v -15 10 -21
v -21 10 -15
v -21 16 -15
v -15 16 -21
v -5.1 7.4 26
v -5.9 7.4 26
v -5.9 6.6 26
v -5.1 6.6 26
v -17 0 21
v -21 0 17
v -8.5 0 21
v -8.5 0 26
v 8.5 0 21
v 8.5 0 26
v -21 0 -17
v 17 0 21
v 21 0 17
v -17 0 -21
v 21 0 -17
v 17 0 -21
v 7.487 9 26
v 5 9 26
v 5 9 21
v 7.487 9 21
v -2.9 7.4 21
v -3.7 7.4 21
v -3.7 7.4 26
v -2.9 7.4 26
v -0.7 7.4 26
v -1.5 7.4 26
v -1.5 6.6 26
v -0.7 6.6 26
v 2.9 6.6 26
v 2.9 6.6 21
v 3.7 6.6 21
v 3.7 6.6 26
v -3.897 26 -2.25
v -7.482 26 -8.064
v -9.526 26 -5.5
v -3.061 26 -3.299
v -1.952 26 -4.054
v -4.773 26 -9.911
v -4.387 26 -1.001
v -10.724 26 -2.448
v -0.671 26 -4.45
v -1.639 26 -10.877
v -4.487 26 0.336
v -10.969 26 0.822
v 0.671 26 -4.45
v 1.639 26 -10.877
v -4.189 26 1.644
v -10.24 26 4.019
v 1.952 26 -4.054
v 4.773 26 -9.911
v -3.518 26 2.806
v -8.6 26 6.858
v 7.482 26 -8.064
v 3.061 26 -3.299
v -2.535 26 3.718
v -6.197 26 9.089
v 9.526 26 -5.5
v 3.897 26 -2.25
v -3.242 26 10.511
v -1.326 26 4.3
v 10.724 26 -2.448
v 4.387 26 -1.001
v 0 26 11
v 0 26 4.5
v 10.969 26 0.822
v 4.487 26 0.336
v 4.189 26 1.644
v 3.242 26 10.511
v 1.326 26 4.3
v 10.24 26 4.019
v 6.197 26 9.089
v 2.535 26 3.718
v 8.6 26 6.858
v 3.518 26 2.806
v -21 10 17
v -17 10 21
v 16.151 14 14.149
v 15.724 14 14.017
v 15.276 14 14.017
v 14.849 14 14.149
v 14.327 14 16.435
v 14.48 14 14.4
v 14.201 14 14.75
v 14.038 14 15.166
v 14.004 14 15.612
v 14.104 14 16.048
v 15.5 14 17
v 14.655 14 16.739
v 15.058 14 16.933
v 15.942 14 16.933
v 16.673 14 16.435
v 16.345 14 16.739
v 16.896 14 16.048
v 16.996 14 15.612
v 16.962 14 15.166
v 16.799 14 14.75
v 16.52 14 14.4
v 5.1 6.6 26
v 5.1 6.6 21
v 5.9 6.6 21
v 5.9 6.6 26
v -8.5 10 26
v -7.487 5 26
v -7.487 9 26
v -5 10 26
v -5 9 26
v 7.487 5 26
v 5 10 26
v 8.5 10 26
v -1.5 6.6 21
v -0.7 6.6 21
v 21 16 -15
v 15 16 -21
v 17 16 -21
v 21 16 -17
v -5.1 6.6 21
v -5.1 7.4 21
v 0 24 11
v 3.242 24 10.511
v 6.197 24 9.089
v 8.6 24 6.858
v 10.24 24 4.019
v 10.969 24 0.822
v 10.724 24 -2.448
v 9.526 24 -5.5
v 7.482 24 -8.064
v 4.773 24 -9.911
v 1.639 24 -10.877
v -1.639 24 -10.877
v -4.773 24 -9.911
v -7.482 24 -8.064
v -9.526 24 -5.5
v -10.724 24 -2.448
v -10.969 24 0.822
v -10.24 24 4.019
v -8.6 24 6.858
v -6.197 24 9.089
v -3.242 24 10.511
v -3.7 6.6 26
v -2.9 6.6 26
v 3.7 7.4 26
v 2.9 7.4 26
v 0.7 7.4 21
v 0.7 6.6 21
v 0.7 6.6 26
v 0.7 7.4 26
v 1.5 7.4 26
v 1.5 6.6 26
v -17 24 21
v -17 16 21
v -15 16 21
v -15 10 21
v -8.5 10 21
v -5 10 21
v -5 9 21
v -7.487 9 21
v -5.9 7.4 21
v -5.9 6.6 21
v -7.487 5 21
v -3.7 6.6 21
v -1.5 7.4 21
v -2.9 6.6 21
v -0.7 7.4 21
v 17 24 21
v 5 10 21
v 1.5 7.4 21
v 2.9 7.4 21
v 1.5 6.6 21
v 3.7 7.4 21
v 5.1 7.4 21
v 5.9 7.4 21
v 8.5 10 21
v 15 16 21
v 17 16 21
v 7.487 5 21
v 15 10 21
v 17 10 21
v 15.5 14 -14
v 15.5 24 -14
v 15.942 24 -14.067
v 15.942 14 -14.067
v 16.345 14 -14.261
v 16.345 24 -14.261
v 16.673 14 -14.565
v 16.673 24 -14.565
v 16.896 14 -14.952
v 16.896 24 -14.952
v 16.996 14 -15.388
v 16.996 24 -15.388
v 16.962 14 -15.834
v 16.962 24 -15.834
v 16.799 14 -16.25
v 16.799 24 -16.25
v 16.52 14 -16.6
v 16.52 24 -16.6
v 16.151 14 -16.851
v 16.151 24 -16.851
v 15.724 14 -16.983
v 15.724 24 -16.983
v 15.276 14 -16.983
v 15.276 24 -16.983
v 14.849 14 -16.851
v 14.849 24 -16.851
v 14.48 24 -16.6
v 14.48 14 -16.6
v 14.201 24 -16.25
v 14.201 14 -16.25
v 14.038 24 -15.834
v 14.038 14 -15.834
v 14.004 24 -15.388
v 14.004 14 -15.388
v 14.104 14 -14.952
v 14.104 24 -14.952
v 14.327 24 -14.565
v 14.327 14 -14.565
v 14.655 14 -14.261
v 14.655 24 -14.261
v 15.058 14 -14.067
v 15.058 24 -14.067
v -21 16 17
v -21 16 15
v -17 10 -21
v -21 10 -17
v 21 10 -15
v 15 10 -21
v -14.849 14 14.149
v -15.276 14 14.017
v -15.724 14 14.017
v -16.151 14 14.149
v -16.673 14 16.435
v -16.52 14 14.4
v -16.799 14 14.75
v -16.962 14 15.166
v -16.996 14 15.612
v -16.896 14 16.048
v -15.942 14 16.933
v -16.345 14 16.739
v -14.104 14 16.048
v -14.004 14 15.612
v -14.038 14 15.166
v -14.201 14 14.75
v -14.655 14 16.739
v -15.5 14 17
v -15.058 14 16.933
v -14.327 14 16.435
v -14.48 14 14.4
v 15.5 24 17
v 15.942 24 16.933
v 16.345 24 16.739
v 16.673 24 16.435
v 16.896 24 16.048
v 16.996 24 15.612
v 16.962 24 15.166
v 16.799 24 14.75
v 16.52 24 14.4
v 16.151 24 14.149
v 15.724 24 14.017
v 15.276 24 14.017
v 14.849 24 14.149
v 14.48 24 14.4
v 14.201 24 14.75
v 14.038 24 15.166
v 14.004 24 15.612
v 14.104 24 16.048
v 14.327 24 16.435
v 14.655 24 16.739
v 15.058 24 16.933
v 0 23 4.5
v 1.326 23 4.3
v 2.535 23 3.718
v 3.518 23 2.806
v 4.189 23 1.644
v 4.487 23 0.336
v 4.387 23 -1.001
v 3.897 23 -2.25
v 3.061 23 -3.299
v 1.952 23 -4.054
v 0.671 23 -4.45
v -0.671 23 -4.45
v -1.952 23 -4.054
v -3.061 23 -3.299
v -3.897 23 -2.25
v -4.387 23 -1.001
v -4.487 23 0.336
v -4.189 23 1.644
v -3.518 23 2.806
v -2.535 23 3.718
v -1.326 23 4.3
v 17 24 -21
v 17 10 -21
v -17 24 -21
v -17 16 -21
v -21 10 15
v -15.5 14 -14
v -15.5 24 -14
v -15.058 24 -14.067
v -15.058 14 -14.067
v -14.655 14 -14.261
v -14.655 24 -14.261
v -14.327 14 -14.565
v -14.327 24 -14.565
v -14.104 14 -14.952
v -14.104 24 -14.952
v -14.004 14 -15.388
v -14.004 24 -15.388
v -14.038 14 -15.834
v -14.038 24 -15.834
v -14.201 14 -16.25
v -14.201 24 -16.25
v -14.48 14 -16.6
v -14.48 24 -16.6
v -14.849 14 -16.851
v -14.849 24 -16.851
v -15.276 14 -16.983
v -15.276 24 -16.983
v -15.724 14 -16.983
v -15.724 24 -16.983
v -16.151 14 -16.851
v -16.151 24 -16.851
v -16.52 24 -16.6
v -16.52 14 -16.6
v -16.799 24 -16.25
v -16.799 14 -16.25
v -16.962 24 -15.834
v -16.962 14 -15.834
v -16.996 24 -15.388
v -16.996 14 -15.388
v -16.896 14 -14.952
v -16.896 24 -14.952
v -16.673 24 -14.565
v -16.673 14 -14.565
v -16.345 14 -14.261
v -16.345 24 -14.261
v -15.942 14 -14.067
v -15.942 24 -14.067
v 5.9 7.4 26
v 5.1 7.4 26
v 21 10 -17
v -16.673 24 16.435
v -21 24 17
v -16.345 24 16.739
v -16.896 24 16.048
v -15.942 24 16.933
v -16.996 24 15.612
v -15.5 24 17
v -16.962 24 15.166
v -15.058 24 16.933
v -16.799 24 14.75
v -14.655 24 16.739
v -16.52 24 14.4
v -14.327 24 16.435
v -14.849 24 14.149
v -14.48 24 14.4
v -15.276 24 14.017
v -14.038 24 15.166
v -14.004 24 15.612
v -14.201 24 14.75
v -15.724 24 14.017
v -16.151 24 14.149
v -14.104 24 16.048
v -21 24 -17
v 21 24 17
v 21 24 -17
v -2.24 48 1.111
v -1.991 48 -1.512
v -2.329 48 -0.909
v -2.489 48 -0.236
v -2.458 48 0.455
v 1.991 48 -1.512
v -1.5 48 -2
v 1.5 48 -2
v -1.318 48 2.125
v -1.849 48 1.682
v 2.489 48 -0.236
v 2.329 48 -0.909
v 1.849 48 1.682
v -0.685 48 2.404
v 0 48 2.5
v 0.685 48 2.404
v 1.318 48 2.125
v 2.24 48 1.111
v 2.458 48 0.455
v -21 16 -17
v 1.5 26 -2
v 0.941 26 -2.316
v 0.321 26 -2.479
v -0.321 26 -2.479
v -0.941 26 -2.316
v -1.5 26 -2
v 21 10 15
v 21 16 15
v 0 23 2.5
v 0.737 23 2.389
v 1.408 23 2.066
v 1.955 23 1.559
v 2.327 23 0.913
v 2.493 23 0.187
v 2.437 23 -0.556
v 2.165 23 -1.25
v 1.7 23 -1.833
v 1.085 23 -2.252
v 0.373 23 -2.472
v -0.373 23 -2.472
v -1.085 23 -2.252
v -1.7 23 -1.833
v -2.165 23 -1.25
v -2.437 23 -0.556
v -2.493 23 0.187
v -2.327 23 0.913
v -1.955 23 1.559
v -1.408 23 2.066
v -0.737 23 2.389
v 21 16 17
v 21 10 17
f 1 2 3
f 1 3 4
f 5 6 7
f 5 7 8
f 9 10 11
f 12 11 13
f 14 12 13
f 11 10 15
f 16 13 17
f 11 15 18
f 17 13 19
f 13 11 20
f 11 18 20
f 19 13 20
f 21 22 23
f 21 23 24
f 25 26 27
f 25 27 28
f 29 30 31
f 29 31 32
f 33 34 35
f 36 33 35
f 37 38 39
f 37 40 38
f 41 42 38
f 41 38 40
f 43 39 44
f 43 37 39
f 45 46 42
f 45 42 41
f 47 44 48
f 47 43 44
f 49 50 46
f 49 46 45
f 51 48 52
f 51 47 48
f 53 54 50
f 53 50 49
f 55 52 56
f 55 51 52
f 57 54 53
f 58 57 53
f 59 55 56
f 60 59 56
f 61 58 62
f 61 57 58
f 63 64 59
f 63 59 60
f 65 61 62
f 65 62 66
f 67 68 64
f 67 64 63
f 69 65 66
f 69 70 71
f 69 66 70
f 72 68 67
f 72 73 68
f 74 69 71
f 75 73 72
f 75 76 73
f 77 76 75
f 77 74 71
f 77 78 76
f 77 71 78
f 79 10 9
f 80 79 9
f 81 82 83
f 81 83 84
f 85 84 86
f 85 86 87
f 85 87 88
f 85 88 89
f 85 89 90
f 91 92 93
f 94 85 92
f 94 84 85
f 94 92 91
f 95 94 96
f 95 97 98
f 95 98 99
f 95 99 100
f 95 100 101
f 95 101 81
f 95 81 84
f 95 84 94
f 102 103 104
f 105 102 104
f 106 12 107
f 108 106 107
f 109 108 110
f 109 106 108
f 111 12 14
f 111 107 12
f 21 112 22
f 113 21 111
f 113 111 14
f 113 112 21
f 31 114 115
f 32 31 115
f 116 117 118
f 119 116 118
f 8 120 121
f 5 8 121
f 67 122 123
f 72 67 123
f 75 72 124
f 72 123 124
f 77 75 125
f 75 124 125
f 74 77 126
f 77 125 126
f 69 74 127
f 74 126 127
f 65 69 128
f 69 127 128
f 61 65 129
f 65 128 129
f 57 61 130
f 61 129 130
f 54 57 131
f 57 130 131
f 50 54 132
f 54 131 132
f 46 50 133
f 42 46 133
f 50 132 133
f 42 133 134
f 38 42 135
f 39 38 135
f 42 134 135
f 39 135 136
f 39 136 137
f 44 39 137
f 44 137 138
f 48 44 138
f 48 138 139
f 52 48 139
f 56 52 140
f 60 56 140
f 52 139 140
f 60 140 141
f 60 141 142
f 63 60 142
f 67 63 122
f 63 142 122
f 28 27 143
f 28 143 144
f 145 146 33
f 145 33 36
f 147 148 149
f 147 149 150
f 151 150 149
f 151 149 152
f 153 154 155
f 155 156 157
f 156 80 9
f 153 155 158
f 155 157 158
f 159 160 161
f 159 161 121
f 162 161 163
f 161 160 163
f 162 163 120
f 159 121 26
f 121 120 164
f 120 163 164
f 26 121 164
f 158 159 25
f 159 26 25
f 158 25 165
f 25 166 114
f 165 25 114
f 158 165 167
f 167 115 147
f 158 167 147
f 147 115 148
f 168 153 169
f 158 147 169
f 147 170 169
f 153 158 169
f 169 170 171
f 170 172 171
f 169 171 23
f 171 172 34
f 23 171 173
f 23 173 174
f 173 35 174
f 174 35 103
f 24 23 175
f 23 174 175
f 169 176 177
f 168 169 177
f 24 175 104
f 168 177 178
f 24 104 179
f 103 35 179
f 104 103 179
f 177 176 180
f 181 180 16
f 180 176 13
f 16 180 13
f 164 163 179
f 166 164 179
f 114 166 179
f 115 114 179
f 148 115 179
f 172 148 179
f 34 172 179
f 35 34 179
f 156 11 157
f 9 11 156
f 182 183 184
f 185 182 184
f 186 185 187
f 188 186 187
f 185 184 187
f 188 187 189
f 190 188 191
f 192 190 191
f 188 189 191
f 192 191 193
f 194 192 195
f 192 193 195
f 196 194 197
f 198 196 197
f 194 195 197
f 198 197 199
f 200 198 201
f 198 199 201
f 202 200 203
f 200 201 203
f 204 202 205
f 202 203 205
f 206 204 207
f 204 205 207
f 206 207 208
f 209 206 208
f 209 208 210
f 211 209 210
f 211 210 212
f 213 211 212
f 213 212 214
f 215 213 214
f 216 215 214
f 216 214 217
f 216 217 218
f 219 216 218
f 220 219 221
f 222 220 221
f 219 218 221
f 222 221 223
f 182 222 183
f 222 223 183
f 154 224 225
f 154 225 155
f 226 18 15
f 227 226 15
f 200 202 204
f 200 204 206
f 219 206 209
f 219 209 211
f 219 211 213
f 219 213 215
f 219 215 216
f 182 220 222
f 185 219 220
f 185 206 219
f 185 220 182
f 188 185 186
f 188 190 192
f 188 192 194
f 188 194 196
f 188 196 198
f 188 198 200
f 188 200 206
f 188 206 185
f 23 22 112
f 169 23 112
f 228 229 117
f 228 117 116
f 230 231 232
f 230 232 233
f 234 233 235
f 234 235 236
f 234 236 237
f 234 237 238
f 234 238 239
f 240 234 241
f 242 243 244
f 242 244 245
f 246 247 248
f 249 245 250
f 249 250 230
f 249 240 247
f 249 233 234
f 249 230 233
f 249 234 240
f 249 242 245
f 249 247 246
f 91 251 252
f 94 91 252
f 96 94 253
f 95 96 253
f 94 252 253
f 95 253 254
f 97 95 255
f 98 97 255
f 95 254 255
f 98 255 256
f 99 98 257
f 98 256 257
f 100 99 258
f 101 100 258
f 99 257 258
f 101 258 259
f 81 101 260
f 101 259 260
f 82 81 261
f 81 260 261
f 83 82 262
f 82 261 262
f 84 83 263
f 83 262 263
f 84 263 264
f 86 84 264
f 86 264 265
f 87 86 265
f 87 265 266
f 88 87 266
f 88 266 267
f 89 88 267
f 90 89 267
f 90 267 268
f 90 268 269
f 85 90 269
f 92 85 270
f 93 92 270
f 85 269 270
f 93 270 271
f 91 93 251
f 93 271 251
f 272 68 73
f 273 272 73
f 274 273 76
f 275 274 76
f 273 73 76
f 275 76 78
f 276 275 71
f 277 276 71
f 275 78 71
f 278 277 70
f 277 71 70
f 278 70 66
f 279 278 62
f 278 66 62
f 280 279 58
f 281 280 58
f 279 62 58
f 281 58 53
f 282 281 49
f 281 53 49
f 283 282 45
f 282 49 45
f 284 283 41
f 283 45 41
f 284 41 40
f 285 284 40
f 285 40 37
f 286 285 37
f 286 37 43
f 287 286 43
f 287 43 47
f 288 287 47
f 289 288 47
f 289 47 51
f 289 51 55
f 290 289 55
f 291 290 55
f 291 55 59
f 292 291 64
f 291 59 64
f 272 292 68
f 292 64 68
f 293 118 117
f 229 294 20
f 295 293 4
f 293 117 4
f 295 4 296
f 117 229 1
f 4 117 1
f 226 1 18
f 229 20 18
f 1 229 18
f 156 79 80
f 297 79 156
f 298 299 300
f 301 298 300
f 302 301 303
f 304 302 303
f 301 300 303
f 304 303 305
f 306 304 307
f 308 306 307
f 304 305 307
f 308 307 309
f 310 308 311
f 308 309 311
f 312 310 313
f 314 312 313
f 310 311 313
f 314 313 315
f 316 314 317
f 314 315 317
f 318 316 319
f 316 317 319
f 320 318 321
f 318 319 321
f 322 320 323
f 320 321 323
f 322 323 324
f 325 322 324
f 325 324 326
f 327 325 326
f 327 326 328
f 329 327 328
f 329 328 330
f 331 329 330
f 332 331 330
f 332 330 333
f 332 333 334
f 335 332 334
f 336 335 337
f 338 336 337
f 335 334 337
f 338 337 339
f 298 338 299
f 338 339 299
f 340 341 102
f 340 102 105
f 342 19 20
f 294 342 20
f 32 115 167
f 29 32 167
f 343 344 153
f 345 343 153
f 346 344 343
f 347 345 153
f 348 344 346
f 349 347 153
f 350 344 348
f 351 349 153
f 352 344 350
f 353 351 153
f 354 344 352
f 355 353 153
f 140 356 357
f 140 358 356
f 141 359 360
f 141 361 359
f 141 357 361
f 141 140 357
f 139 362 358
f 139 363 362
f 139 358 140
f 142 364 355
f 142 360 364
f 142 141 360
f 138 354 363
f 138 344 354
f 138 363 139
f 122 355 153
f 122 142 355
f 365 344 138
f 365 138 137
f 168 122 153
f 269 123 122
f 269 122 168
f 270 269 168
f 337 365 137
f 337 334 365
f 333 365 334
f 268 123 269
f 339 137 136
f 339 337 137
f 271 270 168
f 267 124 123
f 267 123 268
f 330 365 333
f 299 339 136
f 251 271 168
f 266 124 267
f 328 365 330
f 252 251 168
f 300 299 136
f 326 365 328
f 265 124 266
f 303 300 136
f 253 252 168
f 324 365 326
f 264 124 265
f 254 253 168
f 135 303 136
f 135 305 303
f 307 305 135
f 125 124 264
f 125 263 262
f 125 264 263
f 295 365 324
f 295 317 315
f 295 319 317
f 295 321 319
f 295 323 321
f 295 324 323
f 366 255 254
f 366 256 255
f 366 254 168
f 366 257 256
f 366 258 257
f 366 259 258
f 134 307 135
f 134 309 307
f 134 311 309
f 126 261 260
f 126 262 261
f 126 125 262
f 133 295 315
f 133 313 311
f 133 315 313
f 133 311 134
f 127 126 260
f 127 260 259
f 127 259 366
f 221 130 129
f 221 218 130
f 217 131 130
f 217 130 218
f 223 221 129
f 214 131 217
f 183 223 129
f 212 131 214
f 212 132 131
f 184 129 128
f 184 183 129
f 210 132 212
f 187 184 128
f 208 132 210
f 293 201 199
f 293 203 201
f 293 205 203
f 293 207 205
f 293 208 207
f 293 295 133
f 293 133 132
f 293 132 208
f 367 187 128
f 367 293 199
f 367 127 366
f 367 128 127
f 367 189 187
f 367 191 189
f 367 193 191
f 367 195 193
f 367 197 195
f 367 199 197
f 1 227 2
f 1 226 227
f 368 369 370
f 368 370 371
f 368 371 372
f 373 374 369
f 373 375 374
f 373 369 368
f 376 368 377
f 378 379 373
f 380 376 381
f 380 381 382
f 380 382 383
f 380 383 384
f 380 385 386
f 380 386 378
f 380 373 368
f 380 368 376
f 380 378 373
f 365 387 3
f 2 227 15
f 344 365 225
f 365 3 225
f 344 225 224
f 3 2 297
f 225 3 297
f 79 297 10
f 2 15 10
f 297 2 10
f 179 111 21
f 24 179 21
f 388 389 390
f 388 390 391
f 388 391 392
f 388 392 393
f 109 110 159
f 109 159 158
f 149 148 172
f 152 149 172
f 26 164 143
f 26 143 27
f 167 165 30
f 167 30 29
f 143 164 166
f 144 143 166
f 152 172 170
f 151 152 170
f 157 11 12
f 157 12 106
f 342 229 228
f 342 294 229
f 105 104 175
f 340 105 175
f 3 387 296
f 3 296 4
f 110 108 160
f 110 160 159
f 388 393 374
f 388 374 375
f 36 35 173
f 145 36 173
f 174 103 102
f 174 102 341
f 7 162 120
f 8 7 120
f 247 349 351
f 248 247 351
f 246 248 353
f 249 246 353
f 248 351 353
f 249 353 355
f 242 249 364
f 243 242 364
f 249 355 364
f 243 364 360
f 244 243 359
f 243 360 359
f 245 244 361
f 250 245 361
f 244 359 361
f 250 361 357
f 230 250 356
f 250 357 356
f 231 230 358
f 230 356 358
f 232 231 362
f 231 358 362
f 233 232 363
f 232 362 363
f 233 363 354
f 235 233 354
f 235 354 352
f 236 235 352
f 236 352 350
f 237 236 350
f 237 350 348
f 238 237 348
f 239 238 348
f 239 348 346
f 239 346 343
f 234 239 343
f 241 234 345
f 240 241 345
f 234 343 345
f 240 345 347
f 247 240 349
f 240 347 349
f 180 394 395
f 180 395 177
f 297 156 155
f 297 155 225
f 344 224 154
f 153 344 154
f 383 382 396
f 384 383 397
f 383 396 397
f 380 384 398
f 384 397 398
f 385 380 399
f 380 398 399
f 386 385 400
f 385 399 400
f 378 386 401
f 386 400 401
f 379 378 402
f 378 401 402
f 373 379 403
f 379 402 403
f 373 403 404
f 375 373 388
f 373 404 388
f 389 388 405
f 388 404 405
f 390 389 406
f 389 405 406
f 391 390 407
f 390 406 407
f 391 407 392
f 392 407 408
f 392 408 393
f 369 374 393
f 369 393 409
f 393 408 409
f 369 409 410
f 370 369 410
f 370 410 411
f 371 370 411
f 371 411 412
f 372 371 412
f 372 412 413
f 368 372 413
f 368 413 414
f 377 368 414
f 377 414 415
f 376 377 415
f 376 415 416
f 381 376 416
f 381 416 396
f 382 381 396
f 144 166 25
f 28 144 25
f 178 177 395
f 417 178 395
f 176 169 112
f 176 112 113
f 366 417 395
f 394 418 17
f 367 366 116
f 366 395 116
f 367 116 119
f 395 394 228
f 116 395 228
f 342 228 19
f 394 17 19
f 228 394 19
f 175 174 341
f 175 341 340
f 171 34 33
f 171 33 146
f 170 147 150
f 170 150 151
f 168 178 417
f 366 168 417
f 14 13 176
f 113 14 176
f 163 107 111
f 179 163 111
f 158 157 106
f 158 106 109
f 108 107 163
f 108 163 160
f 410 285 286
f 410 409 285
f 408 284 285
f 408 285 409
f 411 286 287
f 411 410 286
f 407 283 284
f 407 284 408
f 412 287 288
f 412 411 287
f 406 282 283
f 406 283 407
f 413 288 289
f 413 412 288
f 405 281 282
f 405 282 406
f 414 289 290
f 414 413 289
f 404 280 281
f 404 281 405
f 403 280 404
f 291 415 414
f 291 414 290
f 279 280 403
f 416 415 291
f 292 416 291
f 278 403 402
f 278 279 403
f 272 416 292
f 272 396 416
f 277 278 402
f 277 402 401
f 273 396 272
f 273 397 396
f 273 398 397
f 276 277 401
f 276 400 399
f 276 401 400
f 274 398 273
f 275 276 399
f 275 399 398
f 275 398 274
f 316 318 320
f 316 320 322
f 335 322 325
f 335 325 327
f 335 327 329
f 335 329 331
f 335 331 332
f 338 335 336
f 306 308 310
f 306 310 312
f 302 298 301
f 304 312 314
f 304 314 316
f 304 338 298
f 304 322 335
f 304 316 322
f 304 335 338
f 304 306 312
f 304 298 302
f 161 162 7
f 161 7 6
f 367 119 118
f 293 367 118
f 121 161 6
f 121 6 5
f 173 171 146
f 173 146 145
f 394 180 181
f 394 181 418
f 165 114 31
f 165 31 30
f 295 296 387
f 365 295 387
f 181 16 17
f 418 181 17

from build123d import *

# Parameters (mm, degrees)
EXTRUDE_1_DEPTH     = 10
EXTRUDE_2_DEPTH     = 6
EXTRUDE_3_DEPTH     = 8
SKETCH_5_R          = 11
EXTRUDE_4_DEPTH     = 2
SKETCH_6_R          = 4.5
CUT_EXTRUDE_1_DEPTH = 3
SKETCH_7_R          = 2.5
EXTRUDE_5_DEPTH     = 25
CUT_EXTRUDE_START   = -22
CUT_EXTRUDE_2_DEPTH = 22
SKETCH_9_R          = 1.5
CUT_EXTRUDE_3_DEPTH = 10
SKETCH_10_W         = 17
SKETCH_10_H         = 10
EXTRUDE_6_DEPTH     = 5
SKETCH_11_W         = 14.973580244
SKETCH_11_H         = 4
CUT_EXTRUDE_4_DEPTH = 5
SKETCH_12_W         = 10
SKETCH_12_H         = 1.224563607
CUT_EXTRUDE_5_DEPTH = 5
SKETCH_13_W         = 0.8
SKETCH_13_H         = 0.8
EXTRUDE_7_DEPTH     = 5


with BuildPart() as part:
    # 草图1 → 凸台-拉伸1 (new body)
    with BuildSketch(Plane(origin=(0, 0, 0), x_dir=(1, 0, 0), z_dir=(0, 1, 0))):
        Polygon((-17, -21), (17, -21), (21, -17), (21, 17), (17, 21), (-17, 21), (-21, 17), (-21, -17), align=None)
    extrude(amount=EXTRUDE_1_DEPTH)

    # 草图3 → 凸台-拉伸2 (add)
    with BuildSketch(Plane(origin=(0, 10, 0), x_dir=(1, 0, 0), z_dir=(0, 1, 0))):
        Polygon((15, 21), (21, 15), (21, -15), (15, -21), (-15, -21), (-21, -15), (-21, 15), (-15, 21), align=None)
    extrude(amount=EXTRUDE_2_DEPTH)

    # 草图4 → 凸台-拉伸3 (add)
    with BuildSketch(Plane(origin=(0, 16, 0), x_dir=(1, 0, 0), z_dir=(0, 1, 0))):
        Polygon((15, 21), (-15, 21), (-17, 21), (-21, 17), (-21, 15), (-21, -15), (-21, -17), (-17, -21), (-15, -21), (15, -21), (17, -21), (21, -17), (21, -15), (21, 15), (21, 17), (17, 21), align=None)
    extrude(amount=EXTRUDE_3_DEPTH)

    # 草图5 → 凸台-拉伸4 (add)
    with BuildSketch(Plane(origin=(0, 24, 0), x_dir=(1, 0, 0), z_dir=(0, 1, 0))):
        with Locations(Location((0, 0, 0), (0, 0, 270))):
            Circle(SKETCH_5_R)
    extrude(amount=EXTRUDE_4_DEPTH)

    # 草图6 → 切除-拉伸1 (cut)
    with BuildSketch(Plane(origin=(0, 26, 0), x_dir=(1, 0, 0), z_dir=(0, 1, 0))):
        with Locations(Location((0, 0, 0), (0, 0, 270))):
            Circle(SKETCH_6_R)
    extrude(amount=-CUT_EXTRUDE_1_DEPTH, mode=Mode.SUBTRACT)

    # 草图7 → 凸台-拉伸5 (add)
    with BuildSketch(Plane(origin=(0, 23, 0), x_dir=(1, 0, 0), z_dir=(0, 1, 0))):
        with Locations(Location((0, 0, 0), (0, 0, 270))):
            Circle(SKETCH_7_R)
    extrude(amount=EXTRUDE_5_DEPTH)

    # 草图8 → 切除-拉伸2 (cut)
    with BuildSketch(Plane(origin=(0, 48, 0), x_dir=(1, 0, 0), z_dir=(0, 1, 0)).offset(CUT_EXTRUDE_START)):
        with BuildLine():
            Line((-1.5, 2), (1.5, 2))
            ThreePointArc((1.5, 2), (0, 2.5), (-1.5, 2))
        make_face()
    extrude(amount=CUT_EXTRUDE_2_DEPTH, mode=Mode.SUBTRACT)

    # 草图9 → 切除-拉伸3 (cut)
    with BuildSketch(Plane(origin=(0, 24, 0), x_dir=(1, 0, 0), z_dir=(0, 1, 0))):
        with Locations(Location((-15.5, 15.5, 0), (0, 0, 270))):
            Circle(SKETCH_9_R)
        with Locations(Location((15.5, 15.5, 0), (0, 0, 270))):
            Circle(SKETCH_9_R)
        with Locations(Location((15.5, -15.5, 0), (0, 0, 270))):
            Circle(SKETCH_9_R)
        with Locations(Location((-15.5, -15.5, 0), (0, 0, 270))):
            Circle(SKETCH_9_R)
    extrude(amount=-CUT_EXTRUDE_3_DEPTH, mode=Mode.SUBTRACT)

    # 草图10 → 凸台-拉伸6 (add)
    with BuildSketch(Plane.XY.offset(21)):
        with Locations((0, 5)):
            Rectangle(SKETCH_10_W, SKETCH_10_H)
    extrude(amount=EXTRUDE_6_DEPTH)

    # 草图11 → 切除-拉伸4 (cut)
    with BuildSketch(Plane.XY.offset(26)):
        with Locations((0, 7)):
            Rectangle(SKETCH_11_W, SKETCH_11_H)
    extrude(amount=-CUT_EXTRUDE_4_DEPTH, mode=Mode.SUBTRACT)

    # 草图12 → 切除-拉伸5 (cut)
    with BuildSketch(Plane.XY.offset(26)):
        with Locations((0, 9.612281804)):
            Rectangle(SKETCH_12_W, SKETCH_12_H)
    extrude(amount=-CUT_EXTRUDE_5_DEPTH, mode=Mode.SUBTRACT)

    # 草图13 → 凸台-拉伸7 (add)
    with BuildSketch(Plane.XY.offset(21)):
        with Locations((-5.5, 7)):
            Rectangle(SKETCH_13_W, SKETCH_13_H)
        with Locations((-3.3, 7)):
            Rectangle(SKETCH_13_W, SKETCH_13_H)
        with Locations((-1.1, 7)):
            Rectangle(SKETCH_13_W, SKETCH_13_H)
        with Locations((1.1, 7)):
            Rectangle(SKETCH_13_W, SKETCH_13_H)
        with Locations((3.3, 7)):
            Rectangle(SKETCH_13_W, SKETCH_13_H)
        with Locations((5.5, 7)):
            Rectangle(SKETCH_13_W, SKETCH_13_H)
    extrude(amount=EXTRUDE_7_DEPTH)


solid = part.part
